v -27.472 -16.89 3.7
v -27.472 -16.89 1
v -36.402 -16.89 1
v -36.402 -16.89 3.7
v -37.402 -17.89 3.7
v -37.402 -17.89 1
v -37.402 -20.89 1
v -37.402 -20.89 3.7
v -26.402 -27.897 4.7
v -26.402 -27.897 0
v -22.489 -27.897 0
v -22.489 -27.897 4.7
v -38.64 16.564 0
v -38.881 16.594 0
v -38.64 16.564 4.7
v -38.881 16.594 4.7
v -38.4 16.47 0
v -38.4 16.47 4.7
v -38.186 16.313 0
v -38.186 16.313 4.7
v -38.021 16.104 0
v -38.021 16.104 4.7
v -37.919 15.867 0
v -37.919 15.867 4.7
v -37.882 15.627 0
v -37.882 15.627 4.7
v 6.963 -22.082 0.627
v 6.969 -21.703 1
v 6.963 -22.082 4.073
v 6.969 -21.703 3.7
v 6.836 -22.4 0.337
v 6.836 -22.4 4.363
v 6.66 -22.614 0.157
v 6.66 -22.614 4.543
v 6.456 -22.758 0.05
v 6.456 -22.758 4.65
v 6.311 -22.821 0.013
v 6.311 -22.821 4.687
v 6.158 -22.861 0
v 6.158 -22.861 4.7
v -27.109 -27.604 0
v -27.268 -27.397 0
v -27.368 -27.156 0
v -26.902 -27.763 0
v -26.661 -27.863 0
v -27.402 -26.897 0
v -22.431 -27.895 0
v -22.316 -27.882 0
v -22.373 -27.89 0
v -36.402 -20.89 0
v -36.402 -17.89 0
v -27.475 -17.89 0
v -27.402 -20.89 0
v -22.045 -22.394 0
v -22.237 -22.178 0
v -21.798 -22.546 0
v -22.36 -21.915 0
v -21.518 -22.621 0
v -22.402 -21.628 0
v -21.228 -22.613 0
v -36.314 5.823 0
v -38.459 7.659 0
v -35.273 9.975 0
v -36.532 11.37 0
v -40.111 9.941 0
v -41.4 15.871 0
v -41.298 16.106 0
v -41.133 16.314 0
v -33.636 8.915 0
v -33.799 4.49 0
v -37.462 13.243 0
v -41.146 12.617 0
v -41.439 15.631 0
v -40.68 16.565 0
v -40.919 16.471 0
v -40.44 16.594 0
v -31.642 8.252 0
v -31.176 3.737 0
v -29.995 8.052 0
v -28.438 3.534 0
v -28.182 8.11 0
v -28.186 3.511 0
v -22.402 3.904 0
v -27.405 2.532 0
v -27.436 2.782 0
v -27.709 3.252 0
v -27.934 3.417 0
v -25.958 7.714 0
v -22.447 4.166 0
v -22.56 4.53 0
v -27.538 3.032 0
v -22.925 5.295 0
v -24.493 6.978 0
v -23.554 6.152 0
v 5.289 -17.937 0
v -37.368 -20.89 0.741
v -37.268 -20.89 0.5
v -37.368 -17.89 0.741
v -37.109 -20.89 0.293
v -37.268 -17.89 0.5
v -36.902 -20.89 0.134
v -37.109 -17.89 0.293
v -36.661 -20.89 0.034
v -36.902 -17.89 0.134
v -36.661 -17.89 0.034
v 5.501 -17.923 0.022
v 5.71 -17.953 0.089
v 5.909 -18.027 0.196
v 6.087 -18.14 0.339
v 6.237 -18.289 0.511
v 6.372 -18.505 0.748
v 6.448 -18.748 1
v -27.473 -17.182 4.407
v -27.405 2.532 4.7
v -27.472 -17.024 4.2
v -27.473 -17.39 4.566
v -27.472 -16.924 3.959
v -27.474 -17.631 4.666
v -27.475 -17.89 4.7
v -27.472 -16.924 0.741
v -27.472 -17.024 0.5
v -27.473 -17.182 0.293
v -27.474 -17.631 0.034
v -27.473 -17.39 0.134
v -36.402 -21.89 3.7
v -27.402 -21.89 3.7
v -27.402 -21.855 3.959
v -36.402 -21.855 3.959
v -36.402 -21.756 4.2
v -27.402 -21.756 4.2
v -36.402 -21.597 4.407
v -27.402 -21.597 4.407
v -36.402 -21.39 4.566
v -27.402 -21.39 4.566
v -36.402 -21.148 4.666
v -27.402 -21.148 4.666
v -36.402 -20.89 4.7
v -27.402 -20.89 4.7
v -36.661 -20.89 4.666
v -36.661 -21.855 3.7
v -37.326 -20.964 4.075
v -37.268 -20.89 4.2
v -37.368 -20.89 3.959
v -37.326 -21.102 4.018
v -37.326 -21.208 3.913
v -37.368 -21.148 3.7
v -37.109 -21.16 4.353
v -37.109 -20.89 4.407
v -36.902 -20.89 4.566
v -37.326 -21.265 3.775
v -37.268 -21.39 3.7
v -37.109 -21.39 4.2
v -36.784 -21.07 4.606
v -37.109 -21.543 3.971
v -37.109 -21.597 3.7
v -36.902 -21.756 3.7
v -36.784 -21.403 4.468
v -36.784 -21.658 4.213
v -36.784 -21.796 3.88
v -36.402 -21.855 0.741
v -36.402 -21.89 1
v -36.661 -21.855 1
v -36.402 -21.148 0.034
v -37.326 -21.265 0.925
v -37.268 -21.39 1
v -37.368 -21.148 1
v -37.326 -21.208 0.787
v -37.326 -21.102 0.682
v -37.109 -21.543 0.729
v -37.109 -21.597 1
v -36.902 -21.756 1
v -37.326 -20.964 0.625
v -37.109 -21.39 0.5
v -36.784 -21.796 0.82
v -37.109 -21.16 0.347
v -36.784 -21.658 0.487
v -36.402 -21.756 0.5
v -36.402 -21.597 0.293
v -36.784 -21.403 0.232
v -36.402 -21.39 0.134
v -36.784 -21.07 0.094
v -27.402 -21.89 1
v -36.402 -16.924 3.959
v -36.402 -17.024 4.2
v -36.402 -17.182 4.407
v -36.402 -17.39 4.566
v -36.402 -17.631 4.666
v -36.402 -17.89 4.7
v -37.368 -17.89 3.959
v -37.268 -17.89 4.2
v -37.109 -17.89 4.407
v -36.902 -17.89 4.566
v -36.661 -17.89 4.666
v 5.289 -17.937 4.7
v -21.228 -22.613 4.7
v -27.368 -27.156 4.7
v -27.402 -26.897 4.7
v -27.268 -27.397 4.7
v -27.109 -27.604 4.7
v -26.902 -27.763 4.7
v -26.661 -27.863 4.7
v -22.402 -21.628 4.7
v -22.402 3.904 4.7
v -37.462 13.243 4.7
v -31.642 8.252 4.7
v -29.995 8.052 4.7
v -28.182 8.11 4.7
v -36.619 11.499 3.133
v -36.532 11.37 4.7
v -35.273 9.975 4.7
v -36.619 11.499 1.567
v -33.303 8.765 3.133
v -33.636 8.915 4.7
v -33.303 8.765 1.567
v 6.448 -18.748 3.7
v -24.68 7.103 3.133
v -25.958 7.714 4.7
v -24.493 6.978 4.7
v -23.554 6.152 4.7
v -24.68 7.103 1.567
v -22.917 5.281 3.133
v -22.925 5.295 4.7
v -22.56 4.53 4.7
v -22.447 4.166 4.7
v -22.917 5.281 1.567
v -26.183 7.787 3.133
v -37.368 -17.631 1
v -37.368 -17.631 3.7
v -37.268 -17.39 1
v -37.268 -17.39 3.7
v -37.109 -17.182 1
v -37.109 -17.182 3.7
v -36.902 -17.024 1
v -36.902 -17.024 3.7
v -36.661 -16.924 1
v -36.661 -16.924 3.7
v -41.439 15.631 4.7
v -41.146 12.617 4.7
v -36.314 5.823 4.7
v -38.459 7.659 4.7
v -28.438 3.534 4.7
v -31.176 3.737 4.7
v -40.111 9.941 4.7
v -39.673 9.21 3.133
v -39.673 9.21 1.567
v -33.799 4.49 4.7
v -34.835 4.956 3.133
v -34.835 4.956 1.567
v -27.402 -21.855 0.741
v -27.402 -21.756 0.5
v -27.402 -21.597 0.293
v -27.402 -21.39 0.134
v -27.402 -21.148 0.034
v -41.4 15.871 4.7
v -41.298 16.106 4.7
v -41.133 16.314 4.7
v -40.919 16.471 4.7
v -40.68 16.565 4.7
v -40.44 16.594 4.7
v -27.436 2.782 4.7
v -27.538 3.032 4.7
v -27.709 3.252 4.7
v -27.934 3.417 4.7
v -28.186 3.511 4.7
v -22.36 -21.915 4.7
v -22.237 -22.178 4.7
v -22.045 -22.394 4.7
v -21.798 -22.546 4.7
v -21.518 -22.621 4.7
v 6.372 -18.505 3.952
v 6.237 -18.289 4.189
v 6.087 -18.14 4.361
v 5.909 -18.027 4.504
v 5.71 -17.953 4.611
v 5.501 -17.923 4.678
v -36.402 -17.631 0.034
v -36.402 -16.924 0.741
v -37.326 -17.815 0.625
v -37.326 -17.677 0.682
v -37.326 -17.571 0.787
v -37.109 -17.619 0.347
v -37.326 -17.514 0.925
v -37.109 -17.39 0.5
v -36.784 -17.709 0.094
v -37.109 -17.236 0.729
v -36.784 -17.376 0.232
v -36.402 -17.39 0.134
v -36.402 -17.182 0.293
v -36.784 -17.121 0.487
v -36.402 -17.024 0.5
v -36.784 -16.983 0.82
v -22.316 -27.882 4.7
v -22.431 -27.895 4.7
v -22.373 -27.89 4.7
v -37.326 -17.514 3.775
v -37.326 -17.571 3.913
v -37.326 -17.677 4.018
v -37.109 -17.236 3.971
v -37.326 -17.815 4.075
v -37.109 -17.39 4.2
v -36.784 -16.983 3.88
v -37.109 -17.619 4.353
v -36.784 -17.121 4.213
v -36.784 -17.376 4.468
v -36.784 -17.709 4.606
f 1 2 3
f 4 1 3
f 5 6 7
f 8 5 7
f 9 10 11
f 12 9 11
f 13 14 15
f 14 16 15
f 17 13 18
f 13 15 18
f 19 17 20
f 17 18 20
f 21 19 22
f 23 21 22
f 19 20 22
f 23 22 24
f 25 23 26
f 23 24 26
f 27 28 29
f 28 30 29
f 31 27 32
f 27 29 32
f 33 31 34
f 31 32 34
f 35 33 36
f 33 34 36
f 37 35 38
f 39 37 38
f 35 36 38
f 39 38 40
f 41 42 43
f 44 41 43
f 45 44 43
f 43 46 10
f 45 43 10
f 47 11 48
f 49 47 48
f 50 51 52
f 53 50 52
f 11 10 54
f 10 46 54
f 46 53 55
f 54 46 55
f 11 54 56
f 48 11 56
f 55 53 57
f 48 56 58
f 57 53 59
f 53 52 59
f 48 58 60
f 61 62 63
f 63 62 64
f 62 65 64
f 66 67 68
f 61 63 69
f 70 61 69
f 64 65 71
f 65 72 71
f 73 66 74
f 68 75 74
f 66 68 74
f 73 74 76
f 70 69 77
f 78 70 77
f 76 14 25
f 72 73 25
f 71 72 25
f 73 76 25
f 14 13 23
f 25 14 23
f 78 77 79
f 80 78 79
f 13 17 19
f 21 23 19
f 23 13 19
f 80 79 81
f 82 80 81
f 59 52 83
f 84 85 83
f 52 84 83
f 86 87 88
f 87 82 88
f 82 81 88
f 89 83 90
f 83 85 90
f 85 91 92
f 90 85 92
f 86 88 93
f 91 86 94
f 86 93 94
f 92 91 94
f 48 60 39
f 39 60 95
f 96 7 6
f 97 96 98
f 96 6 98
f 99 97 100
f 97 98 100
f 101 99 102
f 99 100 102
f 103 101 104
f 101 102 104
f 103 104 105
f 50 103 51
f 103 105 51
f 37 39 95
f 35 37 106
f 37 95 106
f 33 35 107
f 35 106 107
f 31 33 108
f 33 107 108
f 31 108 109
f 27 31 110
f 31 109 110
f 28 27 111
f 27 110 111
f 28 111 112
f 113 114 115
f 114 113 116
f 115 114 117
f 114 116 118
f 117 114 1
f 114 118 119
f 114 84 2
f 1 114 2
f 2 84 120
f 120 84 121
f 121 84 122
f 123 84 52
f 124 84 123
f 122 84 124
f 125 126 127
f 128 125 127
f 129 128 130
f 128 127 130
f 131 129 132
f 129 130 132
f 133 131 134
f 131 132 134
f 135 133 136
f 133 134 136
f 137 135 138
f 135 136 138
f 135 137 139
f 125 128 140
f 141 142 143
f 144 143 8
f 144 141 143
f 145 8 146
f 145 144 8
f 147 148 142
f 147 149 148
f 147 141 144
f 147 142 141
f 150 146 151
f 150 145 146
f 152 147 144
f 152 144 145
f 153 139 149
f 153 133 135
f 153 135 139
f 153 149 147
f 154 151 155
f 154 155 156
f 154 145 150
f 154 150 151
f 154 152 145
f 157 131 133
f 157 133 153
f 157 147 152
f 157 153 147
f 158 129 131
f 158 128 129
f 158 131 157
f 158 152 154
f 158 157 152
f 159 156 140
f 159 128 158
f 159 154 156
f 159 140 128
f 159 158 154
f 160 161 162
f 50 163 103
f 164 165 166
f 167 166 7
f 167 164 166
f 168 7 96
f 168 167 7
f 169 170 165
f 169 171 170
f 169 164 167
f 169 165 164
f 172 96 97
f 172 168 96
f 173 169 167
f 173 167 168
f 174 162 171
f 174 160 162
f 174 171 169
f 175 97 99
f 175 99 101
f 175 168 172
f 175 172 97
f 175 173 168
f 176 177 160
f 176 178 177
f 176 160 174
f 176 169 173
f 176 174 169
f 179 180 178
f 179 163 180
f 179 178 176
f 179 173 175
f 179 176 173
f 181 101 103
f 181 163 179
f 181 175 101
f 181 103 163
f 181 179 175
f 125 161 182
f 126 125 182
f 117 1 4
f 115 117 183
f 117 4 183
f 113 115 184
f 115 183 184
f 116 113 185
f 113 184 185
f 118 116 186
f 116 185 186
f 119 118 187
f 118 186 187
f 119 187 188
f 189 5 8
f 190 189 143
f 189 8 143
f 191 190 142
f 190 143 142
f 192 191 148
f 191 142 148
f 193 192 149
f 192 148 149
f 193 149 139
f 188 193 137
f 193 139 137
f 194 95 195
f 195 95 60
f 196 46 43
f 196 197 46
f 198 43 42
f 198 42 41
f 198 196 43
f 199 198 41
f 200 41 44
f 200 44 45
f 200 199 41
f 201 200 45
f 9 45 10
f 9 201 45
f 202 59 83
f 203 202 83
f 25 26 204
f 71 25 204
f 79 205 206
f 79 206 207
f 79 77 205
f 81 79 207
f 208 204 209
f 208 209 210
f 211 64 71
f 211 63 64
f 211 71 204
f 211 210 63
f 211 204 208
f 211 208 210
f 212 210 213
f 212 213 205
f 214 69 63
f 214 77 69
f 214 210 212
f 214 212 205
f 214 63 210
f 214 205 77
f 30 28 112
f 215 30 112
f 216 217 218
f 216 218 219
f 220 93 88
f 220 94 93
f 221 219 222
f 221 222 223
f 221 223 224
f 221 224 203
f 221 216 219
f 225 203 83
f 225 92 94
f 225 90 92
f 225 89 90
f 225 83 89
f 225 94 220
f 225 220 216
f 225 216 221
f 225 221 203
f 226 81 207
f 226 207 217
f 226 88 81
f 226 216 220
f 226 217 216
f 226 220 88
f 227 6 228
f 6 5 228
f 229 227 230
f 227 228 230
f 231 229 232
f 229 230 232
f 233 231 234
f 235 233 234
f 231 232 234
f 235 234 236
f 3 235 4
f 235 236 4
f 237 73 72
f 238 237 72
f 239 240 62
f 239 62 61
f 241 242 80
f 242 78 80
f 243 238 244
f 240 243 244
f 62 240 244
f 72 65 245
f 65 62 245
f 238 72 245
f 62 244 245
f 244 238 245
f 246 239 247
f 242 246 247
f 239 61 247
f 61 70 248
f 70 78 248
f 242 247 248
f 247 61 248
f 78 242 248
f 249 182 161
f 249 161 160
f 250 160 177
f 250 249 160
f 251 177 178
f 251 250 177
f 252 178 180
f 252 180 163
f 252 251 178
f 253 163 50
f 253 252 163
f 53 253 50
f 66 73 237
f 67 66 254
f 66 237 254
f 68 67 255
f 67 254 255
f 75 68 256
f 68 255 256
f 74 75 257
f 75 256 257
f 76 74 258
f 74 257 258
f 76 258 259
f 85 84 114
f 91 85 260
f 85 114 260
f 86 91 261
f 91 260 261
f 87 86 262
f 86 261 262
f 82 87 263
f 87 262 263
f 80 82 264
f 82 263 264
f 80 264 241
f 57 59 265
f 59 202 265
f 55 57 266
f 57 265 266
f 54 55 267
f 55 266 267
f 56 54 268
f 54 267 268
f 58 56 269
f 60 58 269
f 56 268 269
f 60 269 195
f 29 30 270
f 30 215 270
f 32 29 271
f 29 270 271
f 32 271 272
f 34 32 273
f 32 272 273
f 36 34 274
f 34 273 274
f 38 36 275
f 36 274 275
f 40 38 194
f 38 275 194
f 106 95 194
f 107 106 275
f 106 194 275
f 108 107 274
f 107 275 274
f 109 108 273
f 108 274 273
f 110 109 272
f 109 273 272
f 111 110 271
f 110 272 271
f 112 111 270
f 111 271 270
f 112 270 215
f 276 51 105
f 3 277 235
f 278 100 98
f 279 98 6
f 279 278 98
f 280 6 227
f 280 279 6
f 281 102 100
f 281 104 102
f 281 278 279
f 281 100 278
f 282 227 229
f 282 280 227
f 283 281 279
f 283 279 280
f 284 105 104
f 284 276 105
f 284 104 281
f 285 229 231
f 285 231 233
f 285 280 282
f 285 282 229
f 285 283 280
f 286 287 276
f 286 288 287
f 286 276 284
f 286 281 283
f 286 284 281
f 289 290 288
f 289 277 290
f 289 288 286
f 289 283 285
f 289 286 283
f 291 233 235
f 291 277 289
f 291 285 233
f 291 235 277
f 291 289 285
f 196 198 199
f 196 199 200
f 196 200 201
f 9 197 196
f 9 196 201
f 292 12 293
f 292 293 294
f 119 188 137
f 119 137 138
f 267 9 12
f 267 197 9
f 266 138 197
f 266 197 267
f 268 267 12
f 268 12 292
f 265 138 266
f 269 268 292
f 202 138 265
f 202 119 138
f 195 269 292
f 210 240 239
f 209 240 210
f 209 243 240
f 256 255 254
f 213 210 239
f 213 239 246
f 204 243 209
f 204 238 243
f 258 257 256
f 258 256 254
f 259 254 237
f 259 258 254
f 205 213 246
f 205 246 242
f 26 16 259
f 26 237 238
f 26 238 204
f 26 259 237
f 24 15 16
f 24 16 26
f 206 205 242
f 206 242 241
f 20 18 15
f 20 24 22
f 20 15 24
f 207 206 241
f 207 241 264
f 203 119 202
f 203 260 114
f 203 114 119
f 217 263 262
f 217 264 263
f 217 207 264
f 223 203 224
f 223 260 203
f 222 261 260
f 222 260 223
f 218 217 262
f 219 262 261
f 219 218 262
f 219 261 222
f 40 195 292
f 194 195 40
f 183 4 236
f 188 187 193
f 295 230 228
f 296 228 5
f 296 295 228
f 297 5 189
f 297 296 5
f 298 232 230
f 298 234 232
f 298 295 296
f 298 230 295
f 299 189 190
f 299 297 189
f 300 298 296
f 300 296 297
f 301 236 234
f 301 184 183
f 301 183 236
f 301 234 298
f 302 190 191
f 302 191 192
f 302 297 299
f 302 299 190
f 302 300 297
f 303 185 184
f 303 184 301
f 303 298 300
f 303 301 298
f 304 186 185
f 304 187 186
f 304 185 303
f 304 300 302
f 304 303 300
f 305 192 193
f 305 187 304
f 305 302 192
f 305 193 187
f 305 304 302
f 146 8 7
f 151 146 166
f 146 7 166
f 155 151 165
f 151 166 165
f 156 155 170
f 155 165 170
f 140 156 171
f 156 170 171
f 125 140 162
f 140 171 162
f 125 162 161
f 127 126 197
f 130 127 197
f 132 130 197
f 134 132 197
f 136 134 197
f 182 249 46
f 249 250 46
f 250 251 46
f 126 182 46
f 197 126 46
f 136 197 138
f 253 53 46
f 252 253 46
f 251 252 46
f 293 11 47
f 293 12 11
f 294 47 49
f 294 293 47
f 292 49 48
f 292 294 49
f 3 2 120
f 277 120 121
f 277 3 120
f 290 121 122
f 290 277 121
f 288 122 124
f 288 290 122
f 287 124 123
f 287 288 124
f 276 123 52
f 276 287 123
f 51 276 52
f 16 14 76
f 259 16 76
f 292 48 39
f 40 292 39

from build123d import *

# Parameters (mm, degrees)
F1_DEPTH = 4.7
F2_R     = 1
F3_R     = 1
F4_R     = 1
F5_R     = 1
F6_R     = 1
F7_R     = 1


with BuildPart() as f1:
    # F0 (on Top) → F1 (new body)
    with BuildSketch(Plane.XY):
        with BuildLine():
            Line((-37.8634879111, 16.5938198038), (-41.3634879111, 16.5938198038))
            add(Edge.make_bspline(
                [(-41.3634879111, 16.5938198038), (-42.3330999579, 8.4070676233), (-34.6984496013, 2.7716392946), (-27.4017257528, 3.6103434673)],
                knots=[0, 0, 0, 0, 19.0657142627, 19.0657142627, 19.0657142627, 19.0657142627], degree=3))
            Line((-27.4017257528, 3.6103434673), (-27.4715846299, -16.8895375016))
            Line((-27.4715846299, -16.8895375016), (-37.4017257528, -16.8895375016))
            Line((-37.4017257528, -16.8895375016), (-37.4017257528, -21.8895375016))
            Line((-37.4017257528, -21.8895375016), (-27.4017257528, -21.8895375016))
            Line((-27.4017257528, -21.8895375016), (-27.4017257528, -27.8969056376))
            Line((-27.4017257528, -27.8969056376), (-22.4017257528, -27.8969056376))
            Line((-22.4017257528, -27.8969056376), (-22.4017257528, -22.8197725782))
            Line((-22.4017257528, -22.8197725782), (-22.4017257528, 3.9038568961))
            add(Edge.make_bspline(
                [(-28.182390092, 8.1103434673), (-23.6468304455, 7.92984111), (-22.4574972274, 4.6390707602), (-22.4017257528, 3.9038568961)],
                knots=[0, 0, 0, 0, 7.1491684465, 7.1491684465, 7.1491684465, 7.1491684465], degree=3))
            add(Edge.make_bspline(
                [(-37.8634879111, 16.5938198038), (-38.2162182752, 11.5384167701), (-34.5331529288, 7.4555239978), (-28.182390092, 8.1103434673)],
                knots=[0, 0, 0, 0, 12.8721803023, 12.8721803023, 12.8721803023, 12.8721803023], degree=3))
        make_face()
        Polygon((6.2742659492, -17.7634215425), (-22.4017257528, -22.8197725782), (-22.4017257528, -27.8969056376), (7.1425068376, -22.6874603076), align=None)
    extrude(amount=F1_DEPTH)

    # F2
    f2_edges = [f1.edges().sort_by_distance(p)[0] for p in [
        (-32.436655, -16.889538, 4.7),
        (-32.436655, -16.889538, 0),
        (-32.401726, -21.889538, 4.7),
        (-32.401726, -21.889538, 0),
    ]]
    fillet(f2_edges, radius=F2_R)

    # F3
    f3_edges = [f1.edges().sort_by_distance(p)[0] for p in [
        (-27.401726, -27.896906, 2.35),
        (-27.401726, 3.610343, 2.35),
    ]]
    fillet(f3_edges, radius=F3_R)

    # F4
    f4_edges = [f1.edges().sort_by_distance(p)[0] for p in [
        (-41.363488, 16.59382, 2.35),
        (-37.863488, 16.59382, 2.35),
    ]]
    fillet(f4_edges, radius=F4_R)

    # F5
    f5_edges = [f1.edges().sort_by_distance(p)[0] for p in [
        (-22.401726, -22.819773, 2.35),
        (6.274266, -17.763422, 2.35),
        (7.142507, -22.68746, 2.35),
        (6.708386, -20.225441, 0),
        (6.708386, -20.225441, 4.7),
    ]]
    fillet(f5_edges, radius=F5_R)

    # F6
    f6_edges = [f1.edges().sort_by_distance(p)[0] for p in [
        (-37.401726, -16.889538, 2.35),
        (-37.401726, -17.182431, 0.292893),
        (-37.401726, -17.182431, 4.407107),
        (-37.401726, -19.389538, 0),
        (-37.401726, -19.389538, 4.7),
        (-37.401726, -21.596644, 0.292893),
        (-37.401726, -21.596644, 4.407107),
        (-37.401726, -21.889538, 2.35),
    ]]
    fillet(f6_edges, radius=F6_R)

    # F7
    f7_edges = [f1.edges().sort_by_distance(p)[0] for p in [
        (-22.401726, -27.896906, 2.35),
    ]]
    fillet(f7_edges, radius=F7_R)


solid = f1.part
